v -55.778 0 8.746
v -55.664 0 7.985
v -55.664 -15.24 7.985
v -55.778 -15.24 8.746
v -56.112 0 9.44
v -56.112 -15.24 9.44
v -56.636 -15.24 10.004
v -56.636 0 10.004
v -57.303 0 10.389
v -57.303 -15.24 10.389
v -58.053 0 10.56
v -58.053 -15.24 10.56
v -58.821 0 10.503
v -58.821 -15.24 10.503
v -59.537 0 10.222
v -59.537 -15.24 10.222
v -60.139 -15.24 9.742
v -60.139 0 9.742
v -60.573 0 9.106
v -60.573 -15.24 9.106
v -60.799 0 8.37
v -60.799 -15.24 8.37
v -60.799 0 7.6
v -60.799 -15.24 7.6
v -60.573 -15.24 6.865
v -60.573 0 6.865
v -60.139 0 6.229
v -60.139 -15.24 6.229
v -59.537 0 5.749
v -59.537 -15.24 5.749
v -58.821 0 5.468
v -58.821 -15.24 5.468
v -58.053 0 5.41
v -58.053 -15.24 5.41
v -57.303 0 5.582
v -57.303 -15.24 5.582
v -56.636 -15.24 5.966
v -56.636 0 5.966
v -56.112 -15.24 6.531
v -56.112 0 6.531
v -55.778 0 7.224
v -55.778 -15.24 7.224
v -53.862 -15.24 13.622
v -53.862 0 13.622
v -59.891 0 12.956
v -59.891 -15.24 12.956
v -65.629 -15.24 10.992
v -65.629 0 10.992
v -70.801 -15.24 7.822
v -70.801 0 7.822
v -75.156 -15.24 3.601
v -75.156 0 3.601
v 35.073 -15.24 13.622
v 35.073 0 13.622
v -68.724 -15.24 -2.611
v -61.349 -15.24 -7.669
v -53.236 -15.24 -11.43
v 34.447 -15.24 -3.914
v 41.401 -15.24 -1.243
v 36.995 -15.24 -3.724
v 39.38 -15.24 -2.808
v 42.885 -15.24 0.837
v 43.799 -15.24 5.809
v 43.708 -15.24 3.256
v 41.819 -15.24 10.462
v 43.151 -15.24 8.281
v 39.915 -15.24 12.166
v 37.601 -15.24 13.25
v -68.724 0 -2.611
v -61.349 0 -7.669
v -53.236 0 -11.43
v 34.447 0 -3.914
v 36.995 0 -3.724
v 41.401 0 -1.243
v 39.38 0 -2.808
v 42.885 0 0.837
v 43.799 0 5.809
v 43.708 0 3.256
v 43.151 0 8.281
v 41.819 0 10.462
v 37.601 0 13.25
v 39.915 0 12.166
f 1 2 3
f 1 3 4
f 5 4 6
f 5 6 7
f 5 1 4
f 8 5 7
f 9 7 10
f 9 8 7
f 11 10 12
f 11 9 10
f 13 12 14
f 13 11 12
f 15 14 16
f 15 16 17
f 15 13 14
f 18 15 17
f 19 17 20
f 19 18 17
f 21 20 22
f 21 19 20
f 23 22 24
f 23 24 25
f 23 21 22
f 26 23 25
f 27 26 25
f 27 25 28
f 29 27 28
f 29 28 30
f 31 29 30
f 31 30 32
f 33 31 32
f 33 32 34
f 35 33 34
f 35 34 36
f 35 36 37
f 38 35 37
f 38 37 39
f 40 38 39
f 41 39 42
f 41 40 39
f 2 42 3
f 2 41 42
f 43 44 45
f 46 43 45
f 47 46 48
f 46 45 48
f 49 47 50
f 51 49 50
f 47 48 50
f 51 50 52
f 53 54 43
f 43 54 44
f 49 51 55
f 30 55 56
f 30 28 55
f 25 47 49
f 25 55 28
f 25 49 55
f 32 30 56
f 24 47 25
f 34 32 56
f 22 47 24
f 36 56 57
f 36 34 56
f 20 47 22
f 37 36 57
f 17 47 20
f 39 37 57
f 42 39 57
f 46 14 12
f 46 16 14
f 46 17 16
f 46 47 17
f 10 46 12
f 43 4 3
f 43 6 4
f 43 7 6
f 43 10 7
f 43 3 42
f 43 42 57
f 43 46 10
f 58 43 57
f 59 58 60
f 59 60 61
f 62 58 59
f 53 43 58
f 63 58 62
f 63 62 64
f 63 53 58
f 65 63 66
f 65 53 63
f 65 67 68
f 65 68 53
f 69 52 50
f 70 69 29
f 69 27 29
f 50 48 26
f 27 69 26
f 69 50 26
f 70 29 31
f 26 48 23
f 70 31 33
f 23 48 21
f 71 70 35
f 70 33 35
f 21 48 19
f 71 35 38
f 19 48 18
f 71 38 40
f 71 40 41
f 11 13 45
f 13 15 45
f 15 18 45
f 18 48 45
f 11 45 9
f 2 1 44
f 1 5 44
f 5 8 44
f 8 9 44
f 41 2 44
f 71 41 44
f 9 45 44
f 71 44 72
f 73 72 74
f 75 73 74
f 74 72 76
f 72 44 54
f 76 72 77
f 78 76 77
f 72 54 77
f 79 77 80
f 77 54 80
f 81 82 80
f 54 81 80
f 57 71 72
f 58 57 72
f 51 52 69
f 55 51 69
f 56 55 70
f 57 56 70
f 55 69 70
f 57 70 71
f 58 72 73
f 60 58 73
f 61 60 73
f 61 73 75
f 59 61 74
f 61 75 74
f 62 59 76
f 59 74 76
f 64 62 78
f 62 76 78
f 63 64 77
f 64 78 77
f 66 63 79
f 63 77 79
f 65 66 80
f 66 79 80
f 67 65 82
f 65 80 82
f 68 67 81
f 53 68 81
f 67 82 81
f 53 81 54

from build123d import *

# Parameters (mm, degrees)
F0_R     = 2.582307
F1_DEPTH = 15.24


with BuildPart() as f1:
    # F0 (on Front) → F1 (new body)
    with BuildSketch(Plane.XZ):
        with BuildLine():
            Line((35.072878, 13.622056), (-53.861916, 13.622056))
            ThreePointArc((-53.861916, 13.622056), (-65.629053, 10.991668), (-75.156167, 3.601233))
            ThreePointArc((-75.156167, 3.601233), (-65.141959, -5.294066), (-53.235617, -11.430001))
            Line((-53.235617, -11.430001), (34.446575, -3.914384))
            ThreePointArc((34.446575, -3.914384), (43.846688, 4.529301), (35.072878, 13.622056))
        make_face()
        with Locations((-58.246028, 7.985342)):
            Circle(F0_R, mode=Mode.SUBTRACT)
    extrude(amount=F1_DEPTH)


solid = f1.part
